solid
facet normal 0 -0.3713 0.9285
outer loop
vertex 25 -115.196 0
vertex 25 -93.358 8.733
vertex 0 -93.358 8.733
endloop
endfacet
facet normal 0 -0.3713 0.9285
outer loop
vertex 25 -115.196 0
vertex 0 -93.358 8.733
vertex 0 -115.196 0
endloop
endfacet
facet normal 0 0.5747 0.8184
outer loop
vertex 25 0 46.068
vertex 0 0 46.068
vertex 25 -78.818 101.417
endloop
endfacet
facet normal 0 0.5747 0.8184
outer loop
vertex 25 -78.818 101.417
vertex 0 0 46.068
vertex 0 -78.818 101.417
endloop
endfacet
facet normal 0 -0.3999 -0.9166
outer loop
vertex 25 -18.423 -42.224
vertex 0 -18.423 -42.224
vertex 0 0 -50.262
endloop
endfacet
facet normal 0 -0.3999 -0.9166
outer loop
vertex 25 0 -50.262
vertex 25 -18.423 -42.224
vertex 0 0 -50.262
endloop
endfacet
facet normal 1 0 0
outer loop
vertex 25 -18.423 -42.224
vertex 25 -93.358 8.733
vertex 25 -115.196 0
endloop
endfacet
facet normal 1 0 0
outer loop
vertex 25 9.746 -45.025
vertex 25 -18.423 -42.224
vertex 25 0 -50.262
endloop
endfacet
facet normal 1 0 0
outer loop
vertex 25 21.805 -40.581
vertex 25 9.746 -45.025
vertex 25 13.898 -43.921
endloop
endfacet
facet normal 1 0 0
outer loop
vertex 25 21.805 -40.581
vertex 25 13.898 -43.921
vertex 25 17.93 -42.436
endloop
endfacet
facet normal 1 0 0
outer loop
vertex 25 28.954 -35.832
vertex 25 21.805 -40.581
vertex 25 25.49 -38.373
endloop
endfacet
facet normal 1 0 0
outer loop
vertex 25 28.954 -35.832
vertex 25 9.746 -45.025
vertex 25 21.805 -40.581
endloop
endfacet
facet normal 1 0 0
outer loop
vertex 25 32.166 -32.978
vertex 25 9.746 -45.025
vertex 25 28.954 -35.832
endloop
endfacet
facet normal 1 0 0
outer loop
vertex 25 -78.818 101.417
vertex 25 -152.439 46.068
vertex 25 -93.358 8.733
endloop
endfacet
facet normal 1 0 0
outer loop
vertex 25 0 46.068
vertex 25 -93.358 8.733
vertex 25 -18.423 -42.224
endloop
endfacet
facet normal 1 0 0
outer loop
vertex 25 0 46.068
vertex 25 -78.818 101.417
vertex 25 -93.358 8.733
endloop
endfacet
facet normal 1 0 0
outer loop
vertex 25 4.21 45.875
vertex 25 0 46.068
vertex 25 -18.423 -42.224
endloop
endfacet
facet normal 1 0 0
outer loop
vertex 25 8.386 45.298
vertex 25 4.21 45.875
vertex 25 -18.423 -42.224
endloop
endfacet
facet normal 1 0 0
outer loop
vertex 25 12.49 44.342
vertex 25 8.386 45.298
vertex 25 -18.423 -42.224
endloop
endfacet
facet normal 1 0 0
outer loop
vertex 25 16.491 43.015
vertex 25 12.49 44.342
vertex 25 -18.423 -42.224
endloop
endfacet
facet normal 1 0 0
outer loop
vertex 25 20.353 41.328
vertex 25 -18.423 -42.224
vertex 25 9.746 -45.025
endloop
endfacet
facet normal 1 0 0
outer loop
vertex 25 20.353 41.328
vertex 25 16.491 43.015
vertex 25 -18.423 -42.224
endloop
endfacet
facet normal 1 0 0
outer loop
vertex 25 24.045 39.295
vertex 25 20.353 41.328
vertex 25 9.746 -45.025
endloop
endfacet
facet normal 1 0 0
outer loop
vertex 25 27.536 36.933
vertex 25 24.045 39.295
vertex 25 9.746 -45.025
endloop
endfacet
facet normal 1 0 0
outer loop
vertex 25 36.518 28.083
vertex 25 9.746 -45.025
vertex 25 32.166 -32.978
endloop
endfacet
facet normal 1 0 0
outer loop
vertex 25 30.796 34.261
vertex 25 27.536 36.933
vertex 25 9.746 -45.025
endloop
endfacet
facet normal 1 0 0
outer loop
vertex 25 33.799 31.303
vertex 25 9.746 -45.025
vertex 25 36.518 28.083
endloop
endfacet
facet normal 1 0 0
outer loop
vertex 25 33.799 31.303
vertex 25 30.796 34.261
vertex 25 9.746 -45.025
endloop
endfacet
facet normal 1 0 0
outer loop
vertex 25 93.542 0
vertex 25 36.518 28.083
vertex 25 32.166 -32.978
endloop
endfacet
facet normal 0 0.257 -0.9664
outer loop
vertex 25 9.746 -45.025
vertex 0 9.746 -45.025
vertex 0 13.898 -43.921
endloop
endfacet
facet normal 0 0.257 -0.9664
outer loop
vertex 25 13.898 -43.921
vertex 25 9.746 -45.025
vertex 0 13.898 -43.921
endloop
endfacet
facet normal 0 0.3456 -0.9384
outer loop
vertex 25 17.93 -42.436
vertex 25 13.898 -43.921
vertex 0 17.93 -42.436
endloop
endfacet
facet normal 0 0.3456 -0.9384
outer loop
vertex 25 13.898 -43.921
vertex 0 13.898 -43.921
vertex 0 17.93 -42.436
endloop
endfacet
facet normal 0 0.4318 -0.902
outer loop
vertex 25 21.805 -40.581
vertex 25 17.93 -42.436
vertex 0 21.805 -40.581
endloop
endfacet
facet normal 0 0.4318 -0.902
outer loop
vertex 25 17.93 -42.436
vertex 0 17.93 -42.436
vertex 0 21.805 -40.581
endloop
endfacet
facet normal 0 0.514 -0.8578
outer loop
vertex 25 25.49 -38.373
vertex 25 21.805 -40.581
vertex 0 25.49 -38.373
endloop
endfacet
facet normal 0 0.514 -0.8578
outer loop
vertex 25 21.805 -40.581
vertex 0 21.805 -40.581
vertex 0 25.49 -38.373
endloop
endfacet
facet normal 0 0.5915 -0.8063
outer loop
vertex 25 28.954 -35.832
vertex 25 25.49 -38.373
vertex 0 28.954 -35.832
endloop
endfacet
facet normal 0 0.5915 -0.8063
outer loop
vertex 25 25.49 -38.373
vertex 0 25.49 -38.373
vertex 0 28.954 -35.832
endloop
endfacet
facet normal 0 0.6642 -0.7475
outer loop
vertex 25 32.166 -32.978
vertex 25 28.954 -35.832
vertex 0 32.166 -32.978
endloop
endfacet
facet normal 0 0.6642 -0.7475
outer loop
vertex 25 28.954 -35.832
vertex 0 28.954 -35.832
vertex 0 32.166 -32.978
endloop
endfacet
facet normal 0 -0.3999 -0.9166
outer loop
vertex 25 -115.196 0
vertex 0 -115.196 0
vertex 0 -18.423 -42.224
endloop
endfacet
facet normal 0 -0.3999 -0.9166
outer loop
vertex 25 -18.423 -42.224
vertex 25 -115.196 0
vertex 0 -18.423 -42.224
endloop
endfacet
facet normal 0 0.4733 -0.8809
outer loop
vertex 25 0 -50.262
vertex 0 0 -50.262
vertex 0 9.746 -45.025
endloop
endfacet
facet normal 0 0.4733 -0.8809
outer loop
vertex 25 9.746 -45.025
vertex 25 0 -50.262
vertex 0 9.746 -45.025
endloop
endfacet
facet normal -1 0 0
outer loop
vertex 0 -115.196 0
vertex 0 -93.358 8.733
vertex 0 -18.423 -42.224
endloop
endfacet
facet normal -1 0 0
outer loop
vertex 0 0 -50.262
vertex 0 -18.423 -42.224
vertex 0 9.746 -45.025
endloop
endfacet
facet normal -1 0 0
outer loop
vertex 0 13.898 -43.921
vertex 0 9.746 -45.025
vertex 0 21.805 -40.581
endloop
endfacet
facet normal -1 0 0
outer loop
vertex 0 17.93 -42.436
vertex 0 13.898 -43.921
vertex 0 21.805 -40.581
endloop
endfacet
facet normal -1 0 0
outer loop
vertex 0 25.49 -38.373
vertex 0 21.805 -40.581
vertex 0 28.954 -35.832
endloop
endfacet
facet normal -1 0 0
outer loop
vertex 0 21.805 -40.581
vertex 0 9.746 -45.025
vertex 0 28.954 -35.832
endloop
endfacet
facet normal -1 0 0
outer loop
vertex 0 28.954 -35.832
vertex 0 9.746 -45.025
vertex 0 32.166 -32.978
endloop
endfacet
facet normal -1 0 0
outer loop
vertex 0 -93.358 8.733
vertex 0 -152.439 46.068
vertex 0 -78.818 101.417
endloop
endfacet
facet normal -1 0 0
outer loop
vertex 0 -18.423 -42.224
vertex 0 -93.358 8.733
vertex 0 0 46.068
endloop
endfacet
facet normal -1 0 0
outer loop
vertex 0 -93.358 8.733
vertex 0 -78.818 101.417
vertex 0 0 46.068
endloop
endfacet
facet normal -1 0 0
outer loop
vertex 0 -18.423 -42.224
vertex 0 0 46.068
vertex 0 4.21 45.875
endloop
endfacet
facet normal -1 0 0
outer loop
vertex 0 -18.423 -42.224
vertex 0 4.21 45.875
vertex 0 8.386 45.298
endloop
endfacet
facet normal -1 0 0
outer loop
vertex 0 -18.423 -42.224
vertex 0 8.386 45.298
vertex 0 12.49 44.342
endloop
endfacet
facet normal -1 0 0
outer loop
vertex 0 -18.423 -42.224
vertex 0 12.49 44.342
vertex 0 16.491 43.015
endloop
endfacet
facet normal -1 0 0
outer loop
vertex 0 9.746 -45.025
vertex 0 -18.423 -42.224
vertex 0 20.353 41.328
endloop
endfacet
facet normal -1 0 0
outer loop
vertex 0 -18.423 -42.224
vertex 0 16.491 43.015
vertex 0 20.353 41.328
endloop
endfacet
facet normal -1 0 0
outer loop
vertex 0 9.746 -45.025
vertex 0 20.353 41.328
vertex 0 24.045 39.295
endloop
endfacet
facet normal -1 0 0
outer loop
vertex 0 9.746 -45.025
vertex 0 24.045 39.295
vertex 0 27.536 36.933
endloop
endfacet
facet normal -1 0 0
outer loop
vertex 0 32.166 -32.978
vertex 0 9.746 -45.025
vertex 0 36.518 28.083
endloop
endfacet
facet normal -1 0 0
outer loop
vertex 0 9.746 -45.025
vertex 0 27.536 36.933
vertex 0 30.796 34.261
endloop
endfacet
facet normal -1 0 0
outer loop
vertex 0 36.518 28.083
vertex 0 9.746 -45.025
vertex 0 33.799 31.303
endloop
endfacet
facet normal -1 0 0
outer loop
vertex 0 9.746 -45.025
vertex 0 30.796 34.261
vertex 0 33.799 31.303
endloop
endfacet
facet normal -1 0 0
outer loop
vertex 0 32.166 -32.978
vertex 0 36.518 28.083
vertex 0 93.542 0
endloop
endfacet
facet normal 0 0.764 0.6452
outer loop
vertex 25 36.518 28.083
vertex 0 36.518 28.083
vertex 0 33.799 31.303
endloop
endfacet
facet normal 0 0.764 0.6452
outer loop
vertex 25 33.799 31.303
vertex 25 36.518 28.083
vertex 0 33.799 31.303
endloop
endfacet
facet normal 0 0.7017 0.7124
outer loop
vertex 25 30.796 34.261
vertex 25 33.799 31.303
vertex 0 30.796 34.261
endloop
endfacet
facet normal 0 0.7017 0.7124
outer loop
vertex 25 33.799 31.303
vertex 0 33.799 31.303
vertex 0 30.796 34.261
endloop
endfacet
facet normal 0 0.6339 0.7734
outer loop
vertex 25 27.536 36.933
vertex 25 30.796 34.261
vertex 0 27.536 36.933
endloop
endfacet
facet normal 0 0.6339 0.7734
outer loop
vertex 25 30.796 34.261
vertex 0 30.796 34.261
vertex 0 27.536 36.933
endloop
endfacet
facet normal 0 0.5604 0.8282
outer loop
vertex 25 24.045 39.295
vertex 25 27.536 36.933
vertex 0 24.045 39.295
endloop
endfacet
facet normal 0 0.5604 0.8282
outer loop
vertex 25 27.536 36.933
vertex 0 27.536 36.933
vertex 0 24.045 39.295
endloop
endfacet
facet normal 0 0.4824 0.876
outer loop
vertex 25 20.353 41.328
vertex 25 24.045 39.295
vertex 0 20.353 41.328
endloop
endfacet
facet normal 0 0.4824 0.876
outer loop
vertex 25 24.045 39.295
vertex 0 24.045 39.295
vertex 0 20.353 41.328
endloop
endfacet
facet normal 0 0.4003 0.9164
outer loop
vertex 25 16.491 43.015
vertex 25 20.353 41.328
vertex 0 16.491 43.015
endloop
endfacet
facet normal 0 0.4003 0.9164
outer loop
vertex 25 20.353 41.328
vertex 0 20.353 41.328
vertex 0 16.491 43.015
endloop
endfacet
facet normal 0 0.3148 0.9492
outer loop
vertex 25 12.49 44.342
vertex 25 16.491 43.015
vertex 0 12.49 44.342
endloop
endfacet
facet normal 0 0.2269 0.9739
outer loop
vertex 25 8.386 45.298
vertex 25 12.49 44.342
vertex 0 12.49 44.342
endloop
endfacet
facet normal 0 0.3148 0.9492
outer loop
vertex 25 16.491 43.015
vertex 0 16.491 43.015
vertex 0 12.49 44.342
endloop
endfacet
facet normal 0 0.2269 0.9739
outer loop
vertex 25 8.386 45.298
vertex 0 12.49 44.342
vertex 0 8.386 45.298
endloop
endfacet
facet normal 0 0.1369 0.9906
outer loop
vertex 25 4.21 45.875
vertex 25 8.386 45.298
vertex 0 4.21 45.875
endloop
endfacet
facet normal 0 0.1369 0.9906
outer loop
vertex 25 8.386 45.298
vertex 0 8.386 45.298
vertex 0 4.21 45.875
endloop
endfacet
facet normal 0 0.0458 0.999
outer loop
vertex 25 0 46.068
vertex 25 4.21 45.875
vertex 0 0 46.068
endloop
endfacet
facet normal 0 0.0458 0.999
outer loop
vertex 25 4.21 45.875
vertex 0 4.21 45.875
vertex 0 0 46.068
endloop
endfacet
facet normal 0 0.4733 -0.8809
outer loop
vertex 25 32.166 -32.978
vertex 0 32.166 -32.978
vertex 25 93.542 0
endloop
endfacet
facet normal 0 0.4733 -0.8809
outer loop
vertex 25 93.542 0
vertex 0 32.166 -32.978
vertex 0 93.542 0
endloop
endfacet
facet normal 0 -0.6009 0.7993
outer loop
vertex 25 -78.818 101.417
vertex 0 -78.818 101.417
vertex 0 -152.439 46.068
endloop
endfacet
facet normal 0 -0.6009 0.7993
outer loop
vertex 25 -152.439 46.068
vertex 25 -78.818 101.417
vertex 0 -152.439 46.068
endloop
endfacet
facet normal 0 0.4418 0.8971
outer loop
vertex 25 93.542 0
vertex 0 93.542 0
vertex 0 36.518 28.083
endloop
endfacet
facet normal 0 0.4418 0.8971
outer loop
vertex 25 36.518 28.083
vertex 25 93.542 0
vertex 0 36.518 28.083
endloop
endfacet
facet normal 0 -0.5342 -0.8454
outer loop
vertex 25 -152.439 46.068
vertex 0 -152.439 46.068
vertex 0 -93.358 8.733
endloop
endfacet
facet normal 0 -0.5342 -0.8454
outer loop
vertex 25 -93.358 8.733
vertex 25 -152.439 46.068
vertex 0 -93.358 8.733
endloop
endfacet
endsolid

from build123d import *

# Parameters (mm, degrees)
F1_DEPTH = 25


with BuildPart() as f1:
    # F0 (on Right) → F1 (new body)
    with BuildSketch(Plane.YZ):
        with BuildLine():
            ThreePointArc((32.1662380939, -32.9784685673), (42.45041522, -17.8943708973), (46.0678441232, 0))
            ThreePointArc((46.0678441232, 0), (43.6151120373, 14.8313271197), (36.5180912177, 28.0833629747))
            Line((36.5180912177, 28.0833629747), (0, 46.0678441232))
            Line((0, 46.0678441232), (-31.7657145821, 33.364436744))
            ThreePointArc((-31.7657145821, 33.364436744), (-45.8389447899, 4.5866548494), (-37.7466590893, -26.4090134188))
            Line((-37.7466590893, -26.4090134188), (-7.6490031363, -45.4283943495))
            ThreePointArc((-7.6490031363, -45.4283943495), (1.0679410721, -46.0554639975), (9.7464507406, -45.0250259313))
            Line((9.7464507406, -45.0250259313), (32.1662380939, -32.9784685673))
        make_face()
        with BuildLine():
            ThreePointArc((36.5180912177, 28.0833629747), (43.6151120373, 14.8313271197), (46.0678441232, 0))
            ThreePointArc((46.0678441232, 0), (42.45041522, -17.8943708973), (32.1662380939, -32.9784685673))
            Line((32.1662380939, -32.9784685673), (93.5423001647, 0))
            Line((93.5423001647, 0), (36.5180912177, 28.0833629747))
        make_face()
        with BuildLine():
            Line((0, 46.0678441232), (36.5180912177, 28.0833629747))
            ThreePointArc((36.5180912177, 28.0833629747), (20.3532095034, 41.3278734641), (0, 46.0678441232))
        make_face()
        with BuildLine():
            ThreePointArc((9.7464507406, -45.0250259313), (21.8047760231, -40.5807590459), (32.1662380939, -32.9784685673))
            Line((32.1662380939, -32.9784685673), (9.7464507406, -45.0250259313))
        make_face()
        with BuildLine():
            Line((-31.7657145821, 33.364436744), (0, 46.0678441232))
            ThreePointArc((0, 46.0678441232), (-17.1058263608, 42.7742558868), (-31.7657145821, 33.364436744))
        make_face()
        with BuildLine():
            ThreePointArc((-31.7657145821, 33.364436744), (-17.1058263608, 42.7742558868), (0, 46.0678441232))
            Line((0, 46.0678441232), (-78.8181275129, 101.4166995883))
            Line((-78.8181275129, 101.4166995883), (-152.4393260479, 46.0678441232))
            Line((-152.4393260479, 46.0678441232), (-93.3580668383, 8.7330770393))
            Line((-93.3580668383, 8.7330770393), (-31.7657145821, 33.364436744))
        make_face()
        with BuildLine():
            Line((0, -50.2619702472), (9.7464507406, -45.0250259313))
            ThreePointArc((9.7464507406, -45.0250259313), (1.0679410721, -46.0554639975), (-7.6490031363, -45.4283943495))
            Line((-7.6490031363, -45.4283943495), (0, -50.2619702472))
        make_face()
        with BuildLine():
            ThreePointArc((-37.7466590893, -26.4090134188), (-45.8389447899, 4.5866548494), (-31.7657145821, 33.364436744))
            Line((-31.7657145821, 33.364436744), (-93.3580668383, 8.7330770393))
            Line((-93.3580668383, 8.7330770393), (-37.7466590893, -26.4090134188))
        make_face()
        with BuildLine():
            Line((0, -50.2619702472), (-7.6490031363, -45.4283943495))
            ThreePointArc((-7.6490031363, -45.4283943495), (-13.1340921063, -44.1558816773), (-18.4229631222, -42.2236982269))
            Line((-18.4229631222, -42.2236982269), (0, -50.2619702472))
        make_face()
        with BuildLine():
            ThreePointArc((-18.4229631222, -42.2236982269), (-13.1340921063, -44.1558816773), (-7.6490031363, -45.4283943495))
            Line((-7.6490031363, -45.4283943495), (-37.7466590893, -26.4090134188))
            ThreePointArc((-37.7466590893, -26.4090134188), (-29.1767489405, -35.6505762004), (-18.4229631222, -42.2236982269))
        make_face()
        with BuildLine():
            ThreePointArc((-18.4229631222, -42.2236982269), (-29.1767489405, -35.6505762004), (-37.7466590893, -26.4090134188))
            Line((-37.7466590893, -26.4090134188), (-93.3580668383, 8.7330770393))
            Line((-93.3580668383, 8.7330770393), (-115.1957064867, 0))
            Line((-115.1957064867, 0), (-18.4229631222, -42.2236982269))
        make_face()
    extrude(amount=F1_DEPTH)


solid = f1.part
